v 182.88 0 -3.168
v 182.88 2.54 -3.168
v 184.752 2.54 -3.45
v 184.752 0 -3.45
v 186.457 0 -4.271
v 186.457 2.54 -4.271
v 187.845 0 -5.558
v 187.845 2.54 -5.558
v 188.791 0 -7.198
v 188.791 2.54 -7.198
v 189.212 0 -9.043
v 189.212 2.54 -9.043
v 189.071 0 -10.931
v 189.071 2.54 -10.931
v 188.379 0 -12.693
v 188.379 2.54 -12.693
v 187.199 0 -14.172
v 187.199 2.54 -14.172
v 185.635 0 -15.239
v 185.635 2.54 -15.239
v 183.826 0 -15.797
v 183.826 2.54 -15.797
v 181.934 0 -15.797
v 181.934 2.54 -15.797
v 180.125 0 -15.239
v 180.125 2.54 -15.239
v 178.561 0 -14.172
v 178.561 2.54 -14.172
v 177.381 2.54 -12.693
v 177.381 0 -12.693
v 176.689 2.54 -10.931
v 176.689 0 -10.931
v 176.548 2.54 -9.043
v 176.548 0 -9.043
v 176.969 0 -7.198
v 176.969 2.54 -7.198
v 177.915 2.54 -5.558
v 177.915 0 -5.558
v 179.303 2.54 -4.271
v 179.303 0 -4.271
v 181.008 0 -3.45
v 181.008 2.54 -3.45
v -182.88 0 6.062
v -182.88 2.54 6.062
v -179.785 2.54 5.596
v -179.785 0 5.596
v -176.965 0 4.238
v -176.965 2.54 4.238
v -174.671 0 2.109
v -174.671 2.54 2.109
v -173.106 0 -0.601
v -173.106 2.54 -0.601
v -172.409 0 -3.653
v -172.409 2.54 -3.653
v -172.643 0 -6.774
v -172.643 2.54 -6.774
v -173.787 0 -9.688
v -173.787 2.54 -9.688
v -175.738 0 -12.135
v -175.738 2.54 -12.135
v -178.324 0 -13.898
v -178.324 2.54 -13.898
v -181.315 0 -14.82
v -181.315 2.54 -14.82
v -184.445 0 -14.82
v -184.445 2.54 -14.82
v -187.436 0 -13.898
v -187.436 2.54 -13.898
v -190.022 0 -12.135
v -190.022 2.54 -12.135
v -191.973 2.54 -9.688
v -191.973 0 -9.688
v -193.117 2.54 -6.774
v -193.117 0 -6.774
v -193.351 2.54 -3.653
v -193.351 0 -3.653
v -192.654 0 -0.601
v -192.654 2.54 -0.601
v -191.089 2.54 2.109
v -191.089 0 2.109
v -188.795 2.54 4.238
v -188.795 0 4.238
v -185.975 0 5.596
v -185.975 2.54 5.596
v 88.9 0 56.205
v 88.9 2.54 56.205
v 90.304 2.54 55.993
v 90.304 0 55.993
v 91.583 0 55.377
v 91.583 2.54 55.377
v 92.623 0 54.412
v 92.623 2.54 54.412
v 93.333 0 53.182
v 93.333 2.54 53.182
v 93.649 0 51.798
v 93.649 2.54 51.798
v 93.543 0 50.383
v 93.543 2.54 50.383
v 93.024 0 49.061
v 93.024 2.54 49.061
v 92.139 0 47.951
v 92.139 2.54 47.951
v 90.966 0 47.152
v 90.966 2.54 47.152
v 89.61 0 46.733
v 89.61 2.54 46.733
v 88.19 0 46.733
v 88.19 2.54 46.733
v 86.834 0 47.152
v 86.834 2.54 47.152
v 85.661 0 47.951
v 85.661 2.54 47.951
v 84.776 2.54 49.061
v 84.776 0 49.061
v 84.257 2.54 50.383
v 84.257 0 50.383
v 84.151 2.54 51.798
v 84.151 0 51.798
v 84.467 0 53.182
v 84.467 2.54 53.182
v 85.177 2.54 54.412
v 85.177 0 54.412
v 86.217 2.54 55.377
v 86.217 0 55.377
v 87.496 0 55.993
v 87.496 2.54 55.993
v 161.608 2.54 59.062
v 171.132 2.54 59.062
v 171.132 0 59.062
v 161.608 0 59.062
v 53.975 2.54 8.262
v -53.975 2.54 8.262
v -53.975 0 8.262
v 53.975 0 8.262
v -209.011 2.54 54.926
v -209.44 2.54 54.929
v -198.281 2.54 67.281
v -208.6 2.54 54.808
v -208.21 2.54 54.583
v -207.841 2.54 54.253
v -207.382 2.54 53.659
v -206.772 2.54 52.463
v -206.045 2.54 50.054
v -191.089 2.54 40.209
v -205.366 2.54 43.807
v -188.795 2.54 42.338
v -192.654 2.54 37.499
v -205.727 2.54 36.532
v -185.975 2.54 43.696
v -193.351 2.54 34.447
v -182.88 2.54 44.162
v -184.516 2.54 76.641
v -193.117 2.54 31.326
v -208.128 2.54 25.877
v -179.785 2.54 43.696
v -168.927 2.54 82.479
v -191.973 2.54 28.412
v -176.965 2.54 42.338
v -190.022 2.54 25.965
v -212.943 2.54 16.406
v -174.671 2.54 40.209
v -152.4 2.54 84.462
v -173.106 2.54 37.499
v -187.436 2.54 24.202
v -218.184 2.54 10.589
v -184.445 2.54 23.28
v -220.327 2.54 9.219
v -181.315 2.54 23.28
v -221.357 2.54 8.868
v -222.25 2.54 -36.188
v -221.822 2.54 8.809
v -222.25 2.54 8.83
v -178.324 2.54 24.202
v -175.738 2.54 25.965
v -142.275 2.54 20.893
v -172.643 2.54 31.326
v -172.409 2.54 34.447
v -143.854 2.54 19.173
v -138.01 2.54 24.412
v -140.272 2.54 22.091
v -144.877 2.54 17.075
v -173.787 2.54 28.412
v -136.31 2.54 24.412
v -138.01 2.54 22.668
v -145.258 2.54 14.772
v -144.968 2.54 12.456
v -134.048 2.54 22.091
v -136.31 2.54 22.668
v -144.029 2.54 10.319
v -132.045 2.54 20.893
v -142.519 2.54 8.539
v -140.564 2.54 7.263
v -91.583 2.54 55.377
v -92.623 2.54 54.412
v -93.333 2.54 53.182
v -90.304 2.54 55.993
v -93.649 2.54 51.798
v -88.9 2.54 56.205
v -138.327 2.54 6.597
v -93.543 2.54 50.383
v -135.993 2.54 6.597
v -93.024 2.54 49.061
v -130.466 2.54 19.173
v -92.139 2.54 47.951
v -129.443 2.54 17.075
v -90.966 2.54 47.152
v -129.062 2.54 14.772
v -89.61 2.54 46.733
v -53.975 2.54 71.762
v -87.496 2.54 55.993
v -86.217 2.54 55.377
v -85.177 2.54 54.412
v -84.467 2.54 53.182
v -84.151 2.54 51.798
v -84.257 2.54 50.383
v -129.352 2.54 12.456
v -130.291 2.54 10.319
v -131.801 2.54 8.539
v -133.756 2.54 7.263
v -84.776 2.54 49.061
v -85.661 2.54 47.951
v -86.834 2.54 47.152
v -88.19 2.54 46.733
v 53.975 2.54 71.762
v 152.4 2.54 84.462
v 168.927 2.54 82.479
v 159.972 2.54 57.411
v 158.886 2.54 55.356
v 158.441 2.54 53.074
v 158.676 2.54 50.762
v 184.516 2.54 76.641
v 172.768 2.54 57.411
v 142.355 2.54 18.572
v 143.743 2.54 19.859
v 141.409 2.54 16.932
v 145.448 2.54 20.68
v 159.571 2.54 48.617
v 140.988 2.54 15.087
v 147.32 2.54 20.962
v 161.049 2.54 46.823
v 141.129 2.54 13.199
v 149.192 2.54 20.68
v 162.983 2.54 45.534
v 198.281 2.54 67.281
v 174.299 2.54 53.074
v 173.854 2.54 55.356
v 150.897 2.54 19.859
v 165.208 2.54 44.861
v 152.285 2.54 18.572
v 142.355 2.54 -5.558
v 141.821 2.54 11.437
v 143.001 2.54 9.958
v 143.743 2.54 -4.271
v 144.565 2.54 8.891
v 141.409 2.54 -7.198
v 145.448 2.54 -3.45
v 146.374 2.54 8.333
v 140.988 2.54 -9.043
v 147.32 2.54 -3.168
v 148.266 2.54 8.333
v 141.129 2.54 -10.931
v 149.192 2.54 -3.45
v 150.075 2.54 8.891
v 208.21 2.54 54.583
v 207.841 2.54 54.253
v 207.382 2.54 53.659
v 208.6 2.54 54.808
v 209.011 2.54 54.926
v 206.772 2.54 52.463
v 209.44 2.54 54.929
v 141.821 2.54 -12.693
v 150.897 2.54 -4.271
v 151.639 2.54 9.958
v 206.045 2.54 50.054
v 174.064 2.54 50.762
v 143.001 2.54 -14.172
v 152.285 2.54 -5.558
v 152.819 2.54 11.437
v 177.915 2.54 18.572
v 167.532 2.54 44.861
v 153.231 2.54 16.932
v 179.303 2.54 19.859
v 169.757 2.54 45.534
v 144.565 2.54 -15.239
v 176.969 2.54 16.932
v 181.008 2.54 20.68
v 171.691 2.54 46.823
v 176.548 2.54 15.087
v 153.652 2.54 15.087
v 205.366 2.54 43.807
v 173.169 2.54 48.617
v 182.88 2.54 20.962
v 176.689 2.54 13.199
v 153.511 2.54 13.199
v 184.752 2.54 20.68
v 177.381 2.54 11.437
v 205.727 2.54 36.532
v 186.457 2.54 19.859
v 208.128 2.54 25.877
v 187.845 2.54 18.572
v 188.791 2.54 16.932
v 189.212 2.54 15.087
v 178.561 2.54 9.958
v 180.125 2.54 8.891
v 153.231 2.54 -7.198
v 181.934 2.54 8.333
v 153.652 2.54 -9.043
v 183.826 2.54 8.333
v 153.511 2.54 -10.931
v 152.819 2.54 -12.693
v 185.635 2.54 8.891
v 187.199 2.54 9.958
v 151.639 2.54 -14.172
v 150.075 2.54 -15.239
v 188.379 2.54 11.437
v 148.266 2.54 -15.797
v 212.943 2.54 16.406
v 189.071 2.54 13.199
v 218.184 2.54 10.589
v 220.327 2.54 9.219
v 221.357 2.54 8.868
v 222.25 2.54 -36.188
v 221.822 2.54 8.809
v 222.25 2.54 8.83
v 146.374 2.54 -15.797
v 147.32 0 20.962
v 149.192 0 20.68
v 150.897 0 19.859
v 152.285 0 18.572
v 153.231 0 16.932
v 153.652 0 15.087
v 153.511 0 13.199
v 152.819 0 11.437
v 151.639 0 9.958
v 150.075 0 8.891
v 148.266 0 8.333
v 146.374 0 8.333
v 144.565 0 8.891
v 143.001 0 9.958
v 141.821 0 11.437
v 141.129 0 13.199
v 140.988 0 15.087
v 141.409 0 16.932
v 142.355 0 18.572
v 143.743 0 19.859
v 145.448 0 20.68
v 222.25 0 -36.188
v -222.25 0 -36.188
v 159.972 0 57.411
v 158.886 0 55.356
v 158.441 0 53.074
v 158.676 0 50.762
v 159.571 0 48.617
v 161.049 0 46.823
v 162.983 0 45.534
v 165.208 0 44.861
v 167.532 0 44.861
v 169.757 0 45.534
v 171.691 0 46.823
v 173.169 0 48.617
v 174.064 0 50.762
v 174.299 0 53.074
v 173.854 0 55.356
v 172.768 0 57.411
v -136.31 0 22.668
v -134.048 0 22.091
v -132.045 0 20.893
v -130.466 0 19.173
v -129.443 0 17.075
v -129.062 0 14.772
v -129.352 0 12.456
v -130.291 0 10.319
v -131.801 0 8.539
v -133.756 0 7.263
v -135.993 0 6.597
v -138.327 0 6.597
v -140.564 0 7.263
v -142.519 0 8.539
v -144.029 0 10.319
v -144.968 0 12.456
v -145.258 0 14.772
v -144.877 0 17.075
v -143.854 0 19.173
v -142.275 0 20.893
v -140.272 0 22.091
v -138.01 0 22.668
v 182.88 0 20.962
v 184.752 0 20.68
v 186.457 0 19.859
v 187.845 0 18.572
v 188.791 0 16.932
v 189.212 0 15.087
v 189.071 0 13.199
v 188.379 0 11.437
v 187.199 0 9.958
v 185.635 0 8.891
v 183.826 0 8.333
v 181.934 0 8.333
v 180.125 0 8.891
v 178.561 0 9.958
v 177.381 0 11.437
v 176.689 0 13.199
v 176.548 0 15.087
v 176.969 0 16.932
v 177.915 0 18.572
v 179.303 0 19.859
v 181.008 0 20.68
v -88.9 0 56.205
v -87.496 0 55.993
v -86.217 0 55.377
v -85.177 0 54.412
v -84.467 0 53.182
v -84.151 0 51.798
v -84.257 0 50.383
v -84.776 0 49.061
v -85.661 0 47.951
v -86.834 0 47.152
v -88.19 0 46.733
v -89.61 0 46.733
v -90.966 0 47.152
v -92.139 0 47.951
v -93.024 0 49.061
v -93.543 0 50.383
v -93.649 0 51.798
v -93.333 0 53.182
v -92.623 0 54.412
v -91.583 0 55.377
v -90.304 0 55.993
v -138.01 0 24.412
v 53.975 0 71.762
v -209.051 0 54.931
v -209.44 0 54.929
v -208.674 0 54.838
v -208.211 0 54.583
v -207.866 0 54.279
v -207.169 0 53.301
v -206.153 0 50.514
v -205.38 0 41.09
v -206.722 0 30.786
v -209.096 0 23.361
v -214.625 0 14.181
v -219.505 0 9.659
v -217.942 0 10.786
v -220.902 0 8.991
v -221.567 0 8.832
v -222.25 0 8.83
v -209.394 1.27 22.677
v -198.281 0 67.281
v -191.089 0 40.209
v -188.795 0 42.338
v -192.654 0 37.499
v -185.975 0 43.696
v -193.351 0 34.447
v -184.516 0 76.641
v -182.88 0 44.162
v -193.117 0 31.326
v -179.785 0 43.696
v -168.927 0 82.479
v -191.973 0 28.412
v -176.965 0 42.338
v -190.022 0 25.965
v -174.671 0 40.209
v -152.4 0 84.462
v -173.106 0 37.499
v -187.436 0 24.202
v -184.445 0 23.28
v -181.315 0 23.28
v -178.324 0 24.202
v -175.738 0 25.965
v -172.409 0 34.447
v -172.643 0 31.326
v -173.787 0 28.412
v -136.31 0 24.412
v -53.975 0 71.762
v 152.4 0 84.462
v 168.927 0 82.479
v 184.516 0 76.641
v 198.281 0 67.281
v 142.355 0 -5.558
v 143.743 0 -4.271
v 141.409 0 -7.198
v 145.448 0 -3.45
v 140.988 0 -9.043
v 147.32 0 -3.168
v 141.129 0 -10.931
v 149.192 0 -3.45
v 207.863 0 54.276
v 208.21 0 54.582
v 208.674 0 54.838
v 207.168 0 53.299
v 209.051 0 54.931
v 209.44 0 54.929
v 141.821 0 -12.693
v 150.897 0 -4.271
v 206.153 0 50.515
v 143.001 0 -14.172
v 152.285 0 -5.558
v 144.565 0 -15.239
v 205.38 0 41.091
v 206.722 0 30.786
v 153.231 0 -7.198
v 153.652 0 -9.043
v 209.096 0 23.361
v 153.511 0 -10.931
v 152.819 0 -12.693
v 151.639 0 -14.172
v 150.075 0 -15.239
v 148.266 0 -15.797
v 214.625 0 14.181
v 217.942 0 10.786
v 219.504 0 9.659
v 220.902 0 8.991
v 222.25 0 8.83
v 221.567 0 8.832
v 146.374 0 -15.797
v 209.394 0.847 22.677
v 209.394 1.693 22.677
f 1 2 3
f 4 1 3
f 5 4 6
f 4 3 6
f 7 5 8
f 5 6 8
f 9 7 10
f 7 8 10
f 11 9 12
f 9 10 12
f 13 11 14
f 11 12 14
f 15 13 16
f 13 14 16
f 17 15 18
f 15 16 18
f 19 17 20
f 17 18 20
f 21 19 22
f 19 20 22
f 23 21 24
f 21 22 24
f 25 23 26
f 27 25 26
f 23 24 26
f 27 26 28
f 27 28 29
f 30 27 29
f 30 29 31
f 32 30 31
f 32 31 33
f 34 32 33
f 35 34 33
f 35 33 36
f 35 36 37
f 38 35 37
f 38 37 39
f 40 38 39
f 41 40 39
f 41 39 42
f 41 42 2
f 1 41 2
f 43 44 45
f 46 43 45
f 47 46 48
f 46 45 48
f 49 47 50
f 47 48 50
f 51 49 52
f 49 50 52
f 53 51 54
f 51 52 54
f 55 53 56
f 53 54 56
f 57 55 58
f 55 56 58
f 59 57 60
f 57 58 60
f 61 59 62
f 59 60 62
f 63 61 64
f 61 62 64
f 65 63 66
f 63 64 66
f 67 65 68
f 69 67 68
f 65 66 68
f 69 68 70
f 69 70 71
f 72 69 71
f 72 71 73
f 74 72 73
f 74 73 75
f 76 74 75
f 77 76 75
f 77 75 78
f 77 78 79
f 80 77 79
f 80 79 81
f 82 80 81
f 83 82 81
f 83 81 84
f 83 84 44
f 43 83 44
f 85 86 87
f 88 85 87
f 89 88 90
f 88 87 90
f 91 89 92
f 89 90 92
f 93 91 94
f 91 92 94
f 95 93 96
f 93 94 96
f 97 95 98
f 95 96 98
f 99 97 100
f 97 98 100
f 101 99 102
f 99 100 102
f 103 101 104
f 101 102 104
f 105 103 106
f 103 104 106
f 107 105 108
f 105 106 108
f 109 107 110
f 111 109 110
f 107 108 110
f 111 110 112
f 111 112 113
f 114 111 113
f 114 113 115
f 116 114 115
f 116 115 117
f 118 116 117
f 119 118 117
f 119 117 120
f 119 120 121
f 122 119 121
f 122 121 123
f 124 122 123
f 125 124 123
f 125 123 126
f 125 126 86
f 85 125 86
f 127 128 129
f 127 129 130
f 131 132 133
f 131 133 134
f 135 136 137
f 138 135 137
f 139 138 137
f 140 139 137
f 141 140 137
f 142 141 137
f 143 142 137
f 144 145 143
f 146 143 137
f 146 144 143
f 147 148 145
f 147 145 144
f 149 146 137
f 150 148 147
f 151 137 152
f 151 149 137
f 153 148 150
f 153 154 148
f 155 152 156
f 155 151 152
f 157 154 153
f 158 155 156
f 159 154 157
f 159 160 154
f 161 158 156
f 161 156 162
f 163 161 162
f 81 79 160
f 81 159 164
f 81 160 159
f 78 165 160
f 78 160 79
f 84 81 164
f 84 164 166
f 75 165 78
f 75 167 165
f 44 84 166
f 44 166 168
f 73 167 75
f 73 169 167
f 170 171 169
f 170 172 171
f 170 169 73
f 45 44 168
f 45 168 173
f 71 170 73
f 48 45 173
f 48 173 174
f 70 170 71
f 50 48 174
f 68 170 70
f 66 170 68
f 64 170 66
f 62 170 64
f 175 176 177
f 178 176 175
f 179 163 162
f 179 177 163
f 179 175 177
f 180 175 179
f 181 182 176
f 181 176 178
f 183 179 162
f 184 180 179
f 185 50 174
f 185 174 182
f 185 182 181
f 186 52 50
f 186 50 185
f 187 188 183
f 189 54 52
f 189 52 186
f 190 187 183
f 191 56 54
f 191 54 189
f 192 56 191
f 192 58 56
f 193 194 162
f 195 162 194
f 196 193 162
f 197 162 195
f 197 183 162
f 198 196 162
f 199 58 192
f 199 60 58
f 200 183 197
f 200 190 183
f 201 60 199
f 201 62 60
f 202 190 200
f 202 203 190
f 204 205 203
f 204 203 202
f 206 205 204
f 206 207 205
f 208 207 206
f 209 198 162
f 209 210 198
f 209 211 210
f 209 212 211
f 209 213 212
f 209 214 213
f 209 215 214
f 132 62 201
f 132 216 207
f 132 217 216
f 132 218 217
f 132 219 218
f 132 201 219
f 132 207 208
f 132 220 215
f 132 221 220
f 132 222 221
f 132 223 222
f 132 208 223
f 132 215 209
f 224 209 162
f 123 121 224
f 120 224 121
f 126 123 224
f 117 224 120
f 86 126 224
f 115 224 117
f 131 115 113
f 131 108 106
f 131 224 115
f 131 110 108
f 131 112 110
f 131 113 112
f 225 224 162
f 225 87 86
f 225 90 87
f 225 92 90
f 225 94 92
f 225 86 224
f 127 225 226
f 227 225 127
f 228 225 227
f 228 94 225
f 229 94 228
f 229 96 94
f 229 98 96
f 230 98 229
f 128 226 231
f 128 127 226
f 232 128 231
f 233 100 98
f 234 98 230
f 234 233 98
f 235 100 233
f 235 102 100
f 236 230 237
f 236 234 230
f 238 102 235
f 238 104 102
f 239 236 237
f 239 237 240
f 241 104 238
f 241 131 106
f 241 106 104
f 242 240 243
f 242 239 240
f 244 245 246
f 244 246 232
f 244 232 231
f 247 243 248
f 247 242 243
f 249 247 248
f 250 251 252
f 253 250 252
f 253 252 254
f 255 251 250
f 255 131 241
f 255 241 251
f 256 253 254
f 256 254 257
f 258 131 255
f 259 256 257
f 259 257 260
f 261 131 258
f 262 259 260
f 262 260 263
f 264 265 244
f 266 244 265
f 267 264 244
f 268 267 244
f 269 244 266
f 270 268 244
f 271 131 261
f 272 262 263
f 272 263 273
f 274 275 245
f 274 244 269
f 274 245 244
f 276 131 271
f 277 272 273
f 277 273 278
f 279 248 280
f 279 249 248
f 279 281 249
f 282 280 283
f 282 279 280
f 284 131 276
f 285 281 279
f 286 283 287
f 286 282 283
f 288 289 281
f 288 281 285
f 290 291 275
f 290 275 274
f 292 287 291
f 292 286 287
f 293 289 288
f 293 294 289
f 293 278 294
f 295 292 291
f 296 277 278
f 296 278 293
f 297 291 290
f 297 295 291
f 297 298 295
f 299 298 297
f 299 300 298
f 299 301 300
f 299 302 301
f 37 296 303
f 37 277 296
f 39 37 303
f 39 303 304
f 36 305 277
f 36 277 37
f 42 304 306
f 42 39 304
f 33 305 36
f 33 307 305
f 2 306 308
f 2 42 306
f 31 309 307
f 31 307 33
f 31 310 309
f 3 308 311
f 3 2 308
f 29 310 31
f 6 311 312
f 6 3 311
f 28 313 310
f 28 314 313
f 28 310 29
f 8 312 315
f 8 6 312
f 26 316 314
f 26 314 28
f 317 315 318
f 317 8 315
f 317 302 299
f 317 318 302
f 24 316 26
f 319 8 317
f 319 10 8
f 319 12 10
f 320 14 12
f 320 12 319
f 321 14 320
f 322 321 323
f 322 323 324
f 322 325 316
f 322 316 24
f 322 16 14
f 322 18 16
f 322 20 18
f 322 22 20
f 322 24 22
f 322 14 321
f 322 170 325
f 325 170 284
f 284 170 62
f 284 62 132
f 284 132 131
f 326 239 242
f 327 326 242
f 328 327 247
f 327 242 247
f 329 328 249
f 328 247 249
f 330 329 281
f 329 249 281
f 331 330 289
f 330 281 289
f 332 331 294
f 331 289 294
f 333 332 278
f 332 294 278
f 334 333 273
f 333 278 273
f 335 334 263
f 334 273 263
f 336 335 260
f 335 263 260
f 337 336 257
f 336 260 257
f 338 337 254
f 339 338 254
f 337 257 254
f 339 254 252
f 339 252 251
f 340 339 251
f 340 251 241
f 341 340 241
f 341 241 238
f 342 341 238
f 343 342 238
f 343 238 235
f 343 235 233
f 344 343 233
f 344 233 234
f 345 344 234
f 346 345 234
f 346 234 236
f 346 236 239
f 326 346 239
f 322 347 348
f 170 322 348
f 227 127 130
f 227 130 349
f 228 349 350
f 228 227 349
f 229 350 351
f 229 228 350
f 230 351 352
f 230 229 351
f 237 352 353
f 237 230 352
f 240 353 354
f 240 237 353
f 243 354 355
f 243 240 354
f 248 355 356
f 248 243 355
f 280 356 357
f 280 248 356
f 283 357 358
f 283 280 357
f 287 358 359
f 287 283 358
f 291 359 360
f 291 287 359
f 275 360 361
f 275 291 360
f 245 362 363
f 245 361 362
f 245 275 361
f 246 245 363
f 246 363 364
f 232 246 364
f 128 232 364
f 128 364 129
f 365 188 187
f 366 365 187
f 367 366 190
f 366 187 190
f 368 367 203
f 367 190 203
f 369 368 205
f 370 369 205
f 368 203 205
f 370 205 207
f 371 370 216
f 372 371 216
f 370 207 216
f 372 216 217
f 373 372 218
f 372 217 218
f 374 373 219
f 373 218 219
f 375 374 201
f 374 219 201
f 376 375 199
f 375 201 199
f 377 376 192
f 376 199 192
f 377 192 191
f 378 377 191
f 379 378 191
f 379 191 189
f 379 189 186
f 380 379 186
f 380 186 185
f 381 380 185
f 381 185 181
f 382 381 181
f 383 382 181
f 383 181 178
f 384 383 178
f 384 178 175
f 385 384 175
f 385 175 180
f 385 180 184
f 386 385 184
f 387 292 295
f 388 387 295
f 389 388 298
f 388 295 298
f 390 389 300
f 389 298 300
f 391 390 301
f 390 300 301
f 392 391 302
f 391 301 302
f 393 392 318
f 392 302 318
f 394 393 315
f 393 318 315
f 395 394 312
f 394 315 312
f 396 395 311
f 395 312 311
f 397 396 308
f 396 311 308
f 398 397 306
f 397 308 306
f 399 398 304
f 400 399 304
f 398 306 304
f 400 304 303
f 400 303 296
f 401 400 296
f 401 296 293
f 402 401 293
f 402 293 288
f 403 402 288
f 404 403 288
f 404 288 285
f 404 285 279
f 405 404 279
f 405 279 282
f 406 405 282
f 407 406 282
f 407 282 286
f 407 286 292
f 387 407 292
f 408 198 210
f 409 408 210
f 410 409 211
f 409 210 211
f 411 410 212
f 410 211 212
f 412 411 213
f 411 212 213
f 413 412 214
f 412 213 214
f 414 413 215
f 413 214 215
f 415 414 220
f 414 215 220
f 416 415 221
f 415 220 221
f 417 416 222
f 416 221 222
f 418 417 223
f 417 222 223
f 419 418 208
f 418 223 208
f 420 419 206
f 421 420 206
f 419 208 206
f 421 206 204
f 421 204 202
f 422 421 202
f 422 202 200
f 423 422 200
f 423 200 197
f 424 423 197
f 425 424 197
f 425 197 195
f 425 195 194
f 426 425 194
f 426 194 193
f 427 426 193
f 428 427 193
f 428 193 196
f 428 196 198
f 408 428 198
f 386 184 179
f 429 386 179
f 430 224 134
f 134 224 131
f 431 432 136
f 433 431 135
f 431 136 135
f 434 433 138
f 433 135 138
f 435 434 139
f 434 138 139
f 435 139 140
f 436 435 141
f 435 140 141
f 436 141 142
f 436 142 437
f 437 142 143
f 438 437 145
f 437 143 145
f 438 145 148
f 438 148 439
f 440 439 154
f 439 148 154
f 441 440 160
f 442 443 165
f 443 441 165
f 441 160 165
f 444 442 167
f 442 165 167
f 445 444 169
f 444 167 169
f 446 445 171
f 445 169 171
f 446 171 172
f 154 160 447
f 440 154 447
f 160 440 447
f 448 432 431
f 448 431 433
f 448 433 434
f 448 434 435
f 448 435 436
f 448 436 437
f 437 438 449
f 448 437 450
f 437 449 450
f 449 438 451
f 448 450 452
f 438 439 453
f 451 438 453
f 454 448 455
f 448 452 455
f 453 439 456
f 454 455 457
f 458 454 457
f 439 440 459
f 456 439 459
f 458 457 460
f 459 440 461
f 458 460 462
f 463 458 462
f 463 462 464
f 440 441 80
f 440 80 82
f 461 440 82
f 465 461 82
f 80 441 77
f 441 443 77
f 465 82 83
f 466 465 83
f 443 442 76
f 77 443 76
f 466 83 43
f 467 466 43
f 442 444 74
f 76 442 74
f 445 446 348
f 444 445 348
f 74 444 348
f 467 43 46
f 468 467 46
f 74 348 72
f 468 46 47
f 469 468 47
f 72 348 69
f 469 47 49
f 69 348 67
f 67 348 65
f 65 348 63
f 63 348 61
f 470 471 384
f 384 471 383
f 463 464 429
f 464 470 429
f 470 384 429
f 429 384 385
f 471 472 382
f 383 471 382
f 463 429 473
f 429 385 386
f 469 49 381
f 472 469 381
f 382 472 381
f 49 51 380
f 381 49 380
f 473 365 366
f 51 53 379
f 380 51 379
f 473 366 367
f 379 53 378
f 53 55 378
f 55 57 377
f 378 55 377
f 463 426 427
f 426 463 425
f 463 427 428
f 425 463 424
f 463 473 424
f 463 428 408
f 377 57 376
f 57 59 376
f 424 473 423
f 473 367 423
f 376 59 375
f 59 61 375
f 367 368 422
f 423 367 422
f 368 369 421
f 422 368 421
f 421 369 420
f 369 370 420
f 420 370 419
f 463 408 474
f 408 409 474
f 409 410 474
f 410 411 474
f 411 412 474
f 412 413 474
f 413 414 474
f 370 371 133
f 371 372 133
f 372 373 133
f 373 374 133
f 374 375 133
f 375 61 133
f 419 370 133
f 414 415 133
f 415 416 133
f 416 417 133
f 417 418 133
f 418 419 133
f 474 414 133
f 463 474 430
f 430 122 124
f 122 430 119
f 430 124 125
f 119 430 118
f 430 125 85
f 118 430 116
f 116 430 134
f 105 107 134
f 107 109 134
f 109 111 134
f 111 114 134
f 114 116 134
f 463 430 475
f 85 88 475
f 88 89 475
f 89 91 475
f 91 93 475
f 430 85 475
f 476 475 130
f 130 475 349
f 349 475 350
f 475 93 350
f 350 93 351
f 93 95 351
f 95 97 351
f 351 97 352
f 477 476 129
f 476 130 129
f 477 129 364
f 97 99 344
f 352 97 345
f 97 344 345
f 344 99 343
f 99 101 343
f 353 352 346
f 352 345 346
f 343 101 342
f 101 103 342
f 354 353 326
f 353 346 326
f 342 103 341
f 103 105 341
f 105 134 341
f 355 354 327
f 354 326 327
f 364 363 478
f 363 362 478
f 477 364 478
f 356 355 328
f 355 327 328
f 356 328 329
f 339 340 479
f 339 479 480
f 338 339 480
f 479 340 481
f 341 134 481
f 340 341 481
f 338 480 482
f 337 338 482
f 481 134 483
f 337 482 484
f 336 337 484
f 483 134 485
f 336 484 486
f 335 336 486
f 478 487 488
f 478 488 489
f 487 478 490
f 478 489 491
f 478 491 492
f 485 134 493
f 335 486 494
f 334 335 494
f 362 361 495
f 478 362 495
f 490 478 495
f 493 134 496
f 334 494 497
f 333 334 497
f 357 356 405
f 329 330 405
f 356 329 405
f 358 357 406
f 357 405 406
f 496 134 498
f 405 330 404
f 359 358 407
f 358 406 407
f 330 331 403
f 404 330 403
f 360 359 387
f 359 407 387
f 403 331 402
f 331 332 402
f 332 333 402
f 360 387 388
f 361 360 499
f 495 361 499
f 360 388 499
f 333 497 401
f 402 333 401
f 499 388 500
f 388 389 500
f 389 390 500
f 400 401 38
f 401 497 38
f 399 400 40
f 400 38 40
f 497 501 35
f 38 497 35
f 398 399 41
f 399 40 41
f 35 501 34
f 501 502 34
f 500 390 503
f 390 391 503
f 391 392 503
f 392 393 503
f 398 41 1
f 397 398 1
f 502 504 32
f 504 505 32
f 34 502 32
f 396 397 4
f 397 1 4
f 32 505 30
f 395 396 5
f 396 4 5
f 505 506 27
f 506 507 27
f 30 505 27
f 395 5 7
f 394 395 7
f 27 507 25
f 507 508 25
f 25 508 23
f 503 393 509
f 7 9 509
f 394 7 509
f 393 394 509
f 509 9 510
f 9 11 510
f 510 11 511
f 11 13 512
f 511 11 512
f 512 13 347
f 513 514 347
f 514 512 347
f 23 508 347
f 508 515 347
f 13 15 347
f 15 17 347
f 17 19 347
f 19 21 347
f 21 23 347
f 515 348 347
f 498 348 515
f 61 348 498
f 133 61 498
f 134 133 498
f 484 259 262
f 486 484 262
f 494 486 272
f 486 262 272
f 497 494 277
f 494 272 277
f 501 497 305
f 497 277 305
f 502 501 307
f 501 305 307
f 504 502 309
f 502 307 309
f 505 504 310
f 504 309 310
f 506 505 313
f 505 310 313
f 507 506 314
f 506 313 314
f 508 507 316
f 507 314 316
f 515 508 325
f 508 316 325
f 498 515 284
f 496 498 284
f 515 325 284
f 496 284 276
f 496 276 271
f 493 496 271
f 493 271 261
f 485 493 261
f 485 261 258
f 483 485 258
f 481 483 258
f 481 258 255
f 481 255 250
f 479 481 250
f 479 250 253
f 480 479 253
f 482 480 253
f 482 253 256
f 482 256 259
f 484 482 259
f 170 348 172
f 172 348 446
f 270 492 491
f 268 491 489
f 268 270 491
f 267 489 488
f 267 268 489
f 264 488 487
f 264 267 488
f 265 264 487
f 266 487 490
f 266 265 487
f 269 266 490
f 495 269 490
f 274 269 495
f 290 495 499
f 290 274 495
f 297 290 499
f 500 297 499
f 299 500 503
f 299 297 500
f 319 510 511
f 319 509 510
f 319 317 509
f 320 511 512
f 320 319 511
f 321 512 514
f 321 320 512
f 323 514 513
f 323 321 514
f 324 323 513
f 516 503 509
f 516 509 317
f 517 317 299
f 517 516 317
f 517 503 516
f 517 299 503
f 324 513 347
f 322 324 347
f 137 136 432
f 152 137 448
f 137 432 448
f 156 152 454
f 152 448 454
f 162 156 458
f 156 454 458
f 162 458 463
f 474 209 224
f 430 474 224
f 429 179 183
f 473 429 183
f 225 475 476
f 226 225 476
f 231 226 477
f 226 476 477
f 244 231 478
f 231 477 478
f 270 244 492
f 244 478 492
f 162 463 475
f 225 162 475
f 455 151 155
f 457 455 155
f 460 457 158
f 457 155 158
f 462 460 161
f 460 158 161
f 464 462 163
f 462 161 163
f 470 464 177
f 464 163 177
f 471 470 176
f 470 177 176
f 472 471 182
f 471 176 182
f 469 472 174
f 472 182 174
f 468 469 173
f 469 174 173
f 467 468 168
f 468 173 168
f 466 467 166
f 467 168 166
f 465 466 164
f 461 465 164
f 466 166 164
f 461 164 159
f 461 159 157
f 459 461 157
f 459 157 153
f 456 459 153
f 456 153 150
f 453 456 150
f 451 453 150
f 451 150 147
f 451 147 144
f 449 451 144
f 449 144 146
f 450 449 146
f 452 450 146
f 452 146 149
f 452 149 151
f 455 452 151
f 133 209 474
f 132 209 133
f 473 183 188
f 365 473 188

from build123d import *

# Parameters (mm, degrees)
BOSS_EXTRUDE1_DEPTH = 2.54
SKETCH2_W           = 107.95
SKETCH2_H           = 63.5
CUT_EXTRUDE1_DEPTH  = 238.771783963
CUT_EXTRUDE4_REACH  = 239.772
SKETCH4_R           = 4.7625
SKETCH4_R_2         = 6.35
SKETCH4_R_3         = 10.5
CUT_EXTRUDE3_DEPTH  = 238.771784093


with BuildPart() as part:
    # Sketch1 → Boss-Extrude1 (new body)
    with BuildSketch(Plane(origin=(0, 0, 0), x_dir=(1, 0, 0), z_dir=(0, 1, 0))):
        with BuildLine():
            Line((222.25, -14.612459999), (222.25, 36.187540001))
            Line((222.25, 36.187540001), (-222.25, 36.187540001))
            Line((-222.25, 36.187540001), (-222.25, -14.612459999))
            ThreePointArc((-222.25, -14.612459999), (-201.791408666, -64.003868664), (-152.4, -84.462459999))
            Line((-152.4, -84.462459999), (152.4, -84.462459999))
            ThreePointArc((152.4, -84.462459999), (201.791408666, -64.003868664), (222.25, -14.612459999))
        make_face()
    extrude(amount=BOSS_EXTRUDE1_DEPTH)

    # Sketch2 → Cut-Extrude1 (cut, through all)
    with BuildSketch(Plane(origin=(0, 2.54, 0), x_dir=(1, 0, 0), z_dir=(0, 1, 0))):
        with Locations((0, -40.012459999)):
            Rectangle(SKETCH2_W, SKETCH2_H)
    extrude(amount=-CUT_EXTRUDE1_DEPTH, mode=Mode.SUBTRACT)

    # Sketch5 → Cut-Extrude4 (cut, up to next)
    with BuildSketch(Plane(origin=(0, 2.54, 0), x_dir=(1, 0, 0), z_dir=(0, 1, 0)), mode=Mode.PRIVATE) as cut_extrude4_sk1:
        with BuildLine():
            ThreePointArc((-222.25, -14.612459999), (-218.970589391, -35.763798683), (-209.440289817, -54.929055063))
            add(Edge.make_bspline(
                [(-209.440289817, -54.929055063), (-204.823931799, -55.506078622), (-202.304901657, -25.266816537), (-219.26819847, -8.373976847), (-222.25, -8.829558466)],
                knots=[0, 0, 0, 0, 0.32580352, 0.516674914, 0.516674914, 0.516674914, 0.516674914], degree=3))
            Line((-222.25, -8.829558466), (-222.25, -14.612459999))
        make_face()
    cut_extrude4_tool1 = extrude(cut_extrude4_sk1.sketch, amount=-CUT_EXTRUDE4_REACH, mode=Mode.PRIVATE) & part.part
    # Sketch5 → Cut-Extrude4 (cut, up to next)
    with BuildSketch(Plane(origin=(0, 2.54, 0), x_dir=(1, 0, 0), z_dir=(0, 1, 0)), mode=Mode.PRIVATE) as cut_extrude4_sk2:
        with BuildLine():
            add(Edge.make_bspline(
                [(209.440289817, -54.929055063), (204.823931799, -55.506078622), (202.304901657, -25.266816537), (235.136564978, 7.428480335), (216.288594077, -54.073048471), (209.440289817, -54.929055063)],
                knots=[0, 0, 0, 0, 0.32580352, 0.516674914, 1, 1, 1, 1], degree=3))
        make_face()
    cut_extrude4_tool2 = extrude(cut_extrude4_sk2.sketch, amount=-CUT_EXTRUDE4_REACH, mode=Mode.PRIVATE) & part.part
    add(cut_extrude4_tool1.solids().sort_by_distance((-213.6132, 2.54, 31.506825))[0], mode=Mode.SUBTRACT)
    add(cut_extrude4_tool2.solids().sort_by_distance((214.431319, 2.54, 31.263671))[0], mode=Mode.SUBTRACT)

    # Sketch4 → Cut-Extrude3 (cut, through all)
    with BuildSketch(Plane(origin=(0, 2.54, 0), x_dir=(1, 0, 0), z_dir=(0, 1, 0))):
        with Locations(Location((88.9, -51.442459999, 0), (0, 0, 270))):
            Circle(SKETCH4_R)
        with Locations(Location((147.32, -14.612459999, 0), (0, 0, 270))):
            Circle(SKETCH4_R_2)
        with Locations(Location((147.32, 9.517540001, 0), (0, 0, 270))):
            Circle(SKETCH4_R_2)
        with Locations(Location((182.88, 9.517540001, 0), (0, 0, 270))):
            Circle(SKETCH4_R_2)
        with Locations(Location((-88.9, -51.442459999, 0), (0, 0, 270))):
            Circle(SKETCH4_R)
        with Locations(Location((-182.88, -33.662459999, 0), (0, 0, 270))):
            Circle(SKETCH4_R_3)
        with Locations(Location((-182.88, 4.437540001, 0), (0, 0, 270))):
            Circle(SKETCH4_R_3)
        with Locations(Location((182.88, -14.612459999, 0), (0, 0, 270))):
            Circle(SKETCH4_R_2)
        with BuildLine():
            Line((-138.01, -22.667737772), (-138.01, -24.412459999))
            Line((-138.01, -24.412459999), (-136.31, -24.412459999))
            Line((-136.31, -24.412459999), (-136.31, -22.667737772))
            ThreePointArc((-136.31, -22.667737772), (-137.16, -6.512459999), (-138.01, -22.667737772))
        make_face()
        with BuildLine():
            Line((171.1325, -59.062459999), (161.6075, -59.062459999))
            ThreePointArc((161.6075, -59.062459999), (166.37, -44.774959999), (171.1325, -59.062459999))
        make_face()
    extrude(amount=-CUT_EXTRUDE3_DEPTH, mode=Mode.SUBTRACT)


solid = part.part
